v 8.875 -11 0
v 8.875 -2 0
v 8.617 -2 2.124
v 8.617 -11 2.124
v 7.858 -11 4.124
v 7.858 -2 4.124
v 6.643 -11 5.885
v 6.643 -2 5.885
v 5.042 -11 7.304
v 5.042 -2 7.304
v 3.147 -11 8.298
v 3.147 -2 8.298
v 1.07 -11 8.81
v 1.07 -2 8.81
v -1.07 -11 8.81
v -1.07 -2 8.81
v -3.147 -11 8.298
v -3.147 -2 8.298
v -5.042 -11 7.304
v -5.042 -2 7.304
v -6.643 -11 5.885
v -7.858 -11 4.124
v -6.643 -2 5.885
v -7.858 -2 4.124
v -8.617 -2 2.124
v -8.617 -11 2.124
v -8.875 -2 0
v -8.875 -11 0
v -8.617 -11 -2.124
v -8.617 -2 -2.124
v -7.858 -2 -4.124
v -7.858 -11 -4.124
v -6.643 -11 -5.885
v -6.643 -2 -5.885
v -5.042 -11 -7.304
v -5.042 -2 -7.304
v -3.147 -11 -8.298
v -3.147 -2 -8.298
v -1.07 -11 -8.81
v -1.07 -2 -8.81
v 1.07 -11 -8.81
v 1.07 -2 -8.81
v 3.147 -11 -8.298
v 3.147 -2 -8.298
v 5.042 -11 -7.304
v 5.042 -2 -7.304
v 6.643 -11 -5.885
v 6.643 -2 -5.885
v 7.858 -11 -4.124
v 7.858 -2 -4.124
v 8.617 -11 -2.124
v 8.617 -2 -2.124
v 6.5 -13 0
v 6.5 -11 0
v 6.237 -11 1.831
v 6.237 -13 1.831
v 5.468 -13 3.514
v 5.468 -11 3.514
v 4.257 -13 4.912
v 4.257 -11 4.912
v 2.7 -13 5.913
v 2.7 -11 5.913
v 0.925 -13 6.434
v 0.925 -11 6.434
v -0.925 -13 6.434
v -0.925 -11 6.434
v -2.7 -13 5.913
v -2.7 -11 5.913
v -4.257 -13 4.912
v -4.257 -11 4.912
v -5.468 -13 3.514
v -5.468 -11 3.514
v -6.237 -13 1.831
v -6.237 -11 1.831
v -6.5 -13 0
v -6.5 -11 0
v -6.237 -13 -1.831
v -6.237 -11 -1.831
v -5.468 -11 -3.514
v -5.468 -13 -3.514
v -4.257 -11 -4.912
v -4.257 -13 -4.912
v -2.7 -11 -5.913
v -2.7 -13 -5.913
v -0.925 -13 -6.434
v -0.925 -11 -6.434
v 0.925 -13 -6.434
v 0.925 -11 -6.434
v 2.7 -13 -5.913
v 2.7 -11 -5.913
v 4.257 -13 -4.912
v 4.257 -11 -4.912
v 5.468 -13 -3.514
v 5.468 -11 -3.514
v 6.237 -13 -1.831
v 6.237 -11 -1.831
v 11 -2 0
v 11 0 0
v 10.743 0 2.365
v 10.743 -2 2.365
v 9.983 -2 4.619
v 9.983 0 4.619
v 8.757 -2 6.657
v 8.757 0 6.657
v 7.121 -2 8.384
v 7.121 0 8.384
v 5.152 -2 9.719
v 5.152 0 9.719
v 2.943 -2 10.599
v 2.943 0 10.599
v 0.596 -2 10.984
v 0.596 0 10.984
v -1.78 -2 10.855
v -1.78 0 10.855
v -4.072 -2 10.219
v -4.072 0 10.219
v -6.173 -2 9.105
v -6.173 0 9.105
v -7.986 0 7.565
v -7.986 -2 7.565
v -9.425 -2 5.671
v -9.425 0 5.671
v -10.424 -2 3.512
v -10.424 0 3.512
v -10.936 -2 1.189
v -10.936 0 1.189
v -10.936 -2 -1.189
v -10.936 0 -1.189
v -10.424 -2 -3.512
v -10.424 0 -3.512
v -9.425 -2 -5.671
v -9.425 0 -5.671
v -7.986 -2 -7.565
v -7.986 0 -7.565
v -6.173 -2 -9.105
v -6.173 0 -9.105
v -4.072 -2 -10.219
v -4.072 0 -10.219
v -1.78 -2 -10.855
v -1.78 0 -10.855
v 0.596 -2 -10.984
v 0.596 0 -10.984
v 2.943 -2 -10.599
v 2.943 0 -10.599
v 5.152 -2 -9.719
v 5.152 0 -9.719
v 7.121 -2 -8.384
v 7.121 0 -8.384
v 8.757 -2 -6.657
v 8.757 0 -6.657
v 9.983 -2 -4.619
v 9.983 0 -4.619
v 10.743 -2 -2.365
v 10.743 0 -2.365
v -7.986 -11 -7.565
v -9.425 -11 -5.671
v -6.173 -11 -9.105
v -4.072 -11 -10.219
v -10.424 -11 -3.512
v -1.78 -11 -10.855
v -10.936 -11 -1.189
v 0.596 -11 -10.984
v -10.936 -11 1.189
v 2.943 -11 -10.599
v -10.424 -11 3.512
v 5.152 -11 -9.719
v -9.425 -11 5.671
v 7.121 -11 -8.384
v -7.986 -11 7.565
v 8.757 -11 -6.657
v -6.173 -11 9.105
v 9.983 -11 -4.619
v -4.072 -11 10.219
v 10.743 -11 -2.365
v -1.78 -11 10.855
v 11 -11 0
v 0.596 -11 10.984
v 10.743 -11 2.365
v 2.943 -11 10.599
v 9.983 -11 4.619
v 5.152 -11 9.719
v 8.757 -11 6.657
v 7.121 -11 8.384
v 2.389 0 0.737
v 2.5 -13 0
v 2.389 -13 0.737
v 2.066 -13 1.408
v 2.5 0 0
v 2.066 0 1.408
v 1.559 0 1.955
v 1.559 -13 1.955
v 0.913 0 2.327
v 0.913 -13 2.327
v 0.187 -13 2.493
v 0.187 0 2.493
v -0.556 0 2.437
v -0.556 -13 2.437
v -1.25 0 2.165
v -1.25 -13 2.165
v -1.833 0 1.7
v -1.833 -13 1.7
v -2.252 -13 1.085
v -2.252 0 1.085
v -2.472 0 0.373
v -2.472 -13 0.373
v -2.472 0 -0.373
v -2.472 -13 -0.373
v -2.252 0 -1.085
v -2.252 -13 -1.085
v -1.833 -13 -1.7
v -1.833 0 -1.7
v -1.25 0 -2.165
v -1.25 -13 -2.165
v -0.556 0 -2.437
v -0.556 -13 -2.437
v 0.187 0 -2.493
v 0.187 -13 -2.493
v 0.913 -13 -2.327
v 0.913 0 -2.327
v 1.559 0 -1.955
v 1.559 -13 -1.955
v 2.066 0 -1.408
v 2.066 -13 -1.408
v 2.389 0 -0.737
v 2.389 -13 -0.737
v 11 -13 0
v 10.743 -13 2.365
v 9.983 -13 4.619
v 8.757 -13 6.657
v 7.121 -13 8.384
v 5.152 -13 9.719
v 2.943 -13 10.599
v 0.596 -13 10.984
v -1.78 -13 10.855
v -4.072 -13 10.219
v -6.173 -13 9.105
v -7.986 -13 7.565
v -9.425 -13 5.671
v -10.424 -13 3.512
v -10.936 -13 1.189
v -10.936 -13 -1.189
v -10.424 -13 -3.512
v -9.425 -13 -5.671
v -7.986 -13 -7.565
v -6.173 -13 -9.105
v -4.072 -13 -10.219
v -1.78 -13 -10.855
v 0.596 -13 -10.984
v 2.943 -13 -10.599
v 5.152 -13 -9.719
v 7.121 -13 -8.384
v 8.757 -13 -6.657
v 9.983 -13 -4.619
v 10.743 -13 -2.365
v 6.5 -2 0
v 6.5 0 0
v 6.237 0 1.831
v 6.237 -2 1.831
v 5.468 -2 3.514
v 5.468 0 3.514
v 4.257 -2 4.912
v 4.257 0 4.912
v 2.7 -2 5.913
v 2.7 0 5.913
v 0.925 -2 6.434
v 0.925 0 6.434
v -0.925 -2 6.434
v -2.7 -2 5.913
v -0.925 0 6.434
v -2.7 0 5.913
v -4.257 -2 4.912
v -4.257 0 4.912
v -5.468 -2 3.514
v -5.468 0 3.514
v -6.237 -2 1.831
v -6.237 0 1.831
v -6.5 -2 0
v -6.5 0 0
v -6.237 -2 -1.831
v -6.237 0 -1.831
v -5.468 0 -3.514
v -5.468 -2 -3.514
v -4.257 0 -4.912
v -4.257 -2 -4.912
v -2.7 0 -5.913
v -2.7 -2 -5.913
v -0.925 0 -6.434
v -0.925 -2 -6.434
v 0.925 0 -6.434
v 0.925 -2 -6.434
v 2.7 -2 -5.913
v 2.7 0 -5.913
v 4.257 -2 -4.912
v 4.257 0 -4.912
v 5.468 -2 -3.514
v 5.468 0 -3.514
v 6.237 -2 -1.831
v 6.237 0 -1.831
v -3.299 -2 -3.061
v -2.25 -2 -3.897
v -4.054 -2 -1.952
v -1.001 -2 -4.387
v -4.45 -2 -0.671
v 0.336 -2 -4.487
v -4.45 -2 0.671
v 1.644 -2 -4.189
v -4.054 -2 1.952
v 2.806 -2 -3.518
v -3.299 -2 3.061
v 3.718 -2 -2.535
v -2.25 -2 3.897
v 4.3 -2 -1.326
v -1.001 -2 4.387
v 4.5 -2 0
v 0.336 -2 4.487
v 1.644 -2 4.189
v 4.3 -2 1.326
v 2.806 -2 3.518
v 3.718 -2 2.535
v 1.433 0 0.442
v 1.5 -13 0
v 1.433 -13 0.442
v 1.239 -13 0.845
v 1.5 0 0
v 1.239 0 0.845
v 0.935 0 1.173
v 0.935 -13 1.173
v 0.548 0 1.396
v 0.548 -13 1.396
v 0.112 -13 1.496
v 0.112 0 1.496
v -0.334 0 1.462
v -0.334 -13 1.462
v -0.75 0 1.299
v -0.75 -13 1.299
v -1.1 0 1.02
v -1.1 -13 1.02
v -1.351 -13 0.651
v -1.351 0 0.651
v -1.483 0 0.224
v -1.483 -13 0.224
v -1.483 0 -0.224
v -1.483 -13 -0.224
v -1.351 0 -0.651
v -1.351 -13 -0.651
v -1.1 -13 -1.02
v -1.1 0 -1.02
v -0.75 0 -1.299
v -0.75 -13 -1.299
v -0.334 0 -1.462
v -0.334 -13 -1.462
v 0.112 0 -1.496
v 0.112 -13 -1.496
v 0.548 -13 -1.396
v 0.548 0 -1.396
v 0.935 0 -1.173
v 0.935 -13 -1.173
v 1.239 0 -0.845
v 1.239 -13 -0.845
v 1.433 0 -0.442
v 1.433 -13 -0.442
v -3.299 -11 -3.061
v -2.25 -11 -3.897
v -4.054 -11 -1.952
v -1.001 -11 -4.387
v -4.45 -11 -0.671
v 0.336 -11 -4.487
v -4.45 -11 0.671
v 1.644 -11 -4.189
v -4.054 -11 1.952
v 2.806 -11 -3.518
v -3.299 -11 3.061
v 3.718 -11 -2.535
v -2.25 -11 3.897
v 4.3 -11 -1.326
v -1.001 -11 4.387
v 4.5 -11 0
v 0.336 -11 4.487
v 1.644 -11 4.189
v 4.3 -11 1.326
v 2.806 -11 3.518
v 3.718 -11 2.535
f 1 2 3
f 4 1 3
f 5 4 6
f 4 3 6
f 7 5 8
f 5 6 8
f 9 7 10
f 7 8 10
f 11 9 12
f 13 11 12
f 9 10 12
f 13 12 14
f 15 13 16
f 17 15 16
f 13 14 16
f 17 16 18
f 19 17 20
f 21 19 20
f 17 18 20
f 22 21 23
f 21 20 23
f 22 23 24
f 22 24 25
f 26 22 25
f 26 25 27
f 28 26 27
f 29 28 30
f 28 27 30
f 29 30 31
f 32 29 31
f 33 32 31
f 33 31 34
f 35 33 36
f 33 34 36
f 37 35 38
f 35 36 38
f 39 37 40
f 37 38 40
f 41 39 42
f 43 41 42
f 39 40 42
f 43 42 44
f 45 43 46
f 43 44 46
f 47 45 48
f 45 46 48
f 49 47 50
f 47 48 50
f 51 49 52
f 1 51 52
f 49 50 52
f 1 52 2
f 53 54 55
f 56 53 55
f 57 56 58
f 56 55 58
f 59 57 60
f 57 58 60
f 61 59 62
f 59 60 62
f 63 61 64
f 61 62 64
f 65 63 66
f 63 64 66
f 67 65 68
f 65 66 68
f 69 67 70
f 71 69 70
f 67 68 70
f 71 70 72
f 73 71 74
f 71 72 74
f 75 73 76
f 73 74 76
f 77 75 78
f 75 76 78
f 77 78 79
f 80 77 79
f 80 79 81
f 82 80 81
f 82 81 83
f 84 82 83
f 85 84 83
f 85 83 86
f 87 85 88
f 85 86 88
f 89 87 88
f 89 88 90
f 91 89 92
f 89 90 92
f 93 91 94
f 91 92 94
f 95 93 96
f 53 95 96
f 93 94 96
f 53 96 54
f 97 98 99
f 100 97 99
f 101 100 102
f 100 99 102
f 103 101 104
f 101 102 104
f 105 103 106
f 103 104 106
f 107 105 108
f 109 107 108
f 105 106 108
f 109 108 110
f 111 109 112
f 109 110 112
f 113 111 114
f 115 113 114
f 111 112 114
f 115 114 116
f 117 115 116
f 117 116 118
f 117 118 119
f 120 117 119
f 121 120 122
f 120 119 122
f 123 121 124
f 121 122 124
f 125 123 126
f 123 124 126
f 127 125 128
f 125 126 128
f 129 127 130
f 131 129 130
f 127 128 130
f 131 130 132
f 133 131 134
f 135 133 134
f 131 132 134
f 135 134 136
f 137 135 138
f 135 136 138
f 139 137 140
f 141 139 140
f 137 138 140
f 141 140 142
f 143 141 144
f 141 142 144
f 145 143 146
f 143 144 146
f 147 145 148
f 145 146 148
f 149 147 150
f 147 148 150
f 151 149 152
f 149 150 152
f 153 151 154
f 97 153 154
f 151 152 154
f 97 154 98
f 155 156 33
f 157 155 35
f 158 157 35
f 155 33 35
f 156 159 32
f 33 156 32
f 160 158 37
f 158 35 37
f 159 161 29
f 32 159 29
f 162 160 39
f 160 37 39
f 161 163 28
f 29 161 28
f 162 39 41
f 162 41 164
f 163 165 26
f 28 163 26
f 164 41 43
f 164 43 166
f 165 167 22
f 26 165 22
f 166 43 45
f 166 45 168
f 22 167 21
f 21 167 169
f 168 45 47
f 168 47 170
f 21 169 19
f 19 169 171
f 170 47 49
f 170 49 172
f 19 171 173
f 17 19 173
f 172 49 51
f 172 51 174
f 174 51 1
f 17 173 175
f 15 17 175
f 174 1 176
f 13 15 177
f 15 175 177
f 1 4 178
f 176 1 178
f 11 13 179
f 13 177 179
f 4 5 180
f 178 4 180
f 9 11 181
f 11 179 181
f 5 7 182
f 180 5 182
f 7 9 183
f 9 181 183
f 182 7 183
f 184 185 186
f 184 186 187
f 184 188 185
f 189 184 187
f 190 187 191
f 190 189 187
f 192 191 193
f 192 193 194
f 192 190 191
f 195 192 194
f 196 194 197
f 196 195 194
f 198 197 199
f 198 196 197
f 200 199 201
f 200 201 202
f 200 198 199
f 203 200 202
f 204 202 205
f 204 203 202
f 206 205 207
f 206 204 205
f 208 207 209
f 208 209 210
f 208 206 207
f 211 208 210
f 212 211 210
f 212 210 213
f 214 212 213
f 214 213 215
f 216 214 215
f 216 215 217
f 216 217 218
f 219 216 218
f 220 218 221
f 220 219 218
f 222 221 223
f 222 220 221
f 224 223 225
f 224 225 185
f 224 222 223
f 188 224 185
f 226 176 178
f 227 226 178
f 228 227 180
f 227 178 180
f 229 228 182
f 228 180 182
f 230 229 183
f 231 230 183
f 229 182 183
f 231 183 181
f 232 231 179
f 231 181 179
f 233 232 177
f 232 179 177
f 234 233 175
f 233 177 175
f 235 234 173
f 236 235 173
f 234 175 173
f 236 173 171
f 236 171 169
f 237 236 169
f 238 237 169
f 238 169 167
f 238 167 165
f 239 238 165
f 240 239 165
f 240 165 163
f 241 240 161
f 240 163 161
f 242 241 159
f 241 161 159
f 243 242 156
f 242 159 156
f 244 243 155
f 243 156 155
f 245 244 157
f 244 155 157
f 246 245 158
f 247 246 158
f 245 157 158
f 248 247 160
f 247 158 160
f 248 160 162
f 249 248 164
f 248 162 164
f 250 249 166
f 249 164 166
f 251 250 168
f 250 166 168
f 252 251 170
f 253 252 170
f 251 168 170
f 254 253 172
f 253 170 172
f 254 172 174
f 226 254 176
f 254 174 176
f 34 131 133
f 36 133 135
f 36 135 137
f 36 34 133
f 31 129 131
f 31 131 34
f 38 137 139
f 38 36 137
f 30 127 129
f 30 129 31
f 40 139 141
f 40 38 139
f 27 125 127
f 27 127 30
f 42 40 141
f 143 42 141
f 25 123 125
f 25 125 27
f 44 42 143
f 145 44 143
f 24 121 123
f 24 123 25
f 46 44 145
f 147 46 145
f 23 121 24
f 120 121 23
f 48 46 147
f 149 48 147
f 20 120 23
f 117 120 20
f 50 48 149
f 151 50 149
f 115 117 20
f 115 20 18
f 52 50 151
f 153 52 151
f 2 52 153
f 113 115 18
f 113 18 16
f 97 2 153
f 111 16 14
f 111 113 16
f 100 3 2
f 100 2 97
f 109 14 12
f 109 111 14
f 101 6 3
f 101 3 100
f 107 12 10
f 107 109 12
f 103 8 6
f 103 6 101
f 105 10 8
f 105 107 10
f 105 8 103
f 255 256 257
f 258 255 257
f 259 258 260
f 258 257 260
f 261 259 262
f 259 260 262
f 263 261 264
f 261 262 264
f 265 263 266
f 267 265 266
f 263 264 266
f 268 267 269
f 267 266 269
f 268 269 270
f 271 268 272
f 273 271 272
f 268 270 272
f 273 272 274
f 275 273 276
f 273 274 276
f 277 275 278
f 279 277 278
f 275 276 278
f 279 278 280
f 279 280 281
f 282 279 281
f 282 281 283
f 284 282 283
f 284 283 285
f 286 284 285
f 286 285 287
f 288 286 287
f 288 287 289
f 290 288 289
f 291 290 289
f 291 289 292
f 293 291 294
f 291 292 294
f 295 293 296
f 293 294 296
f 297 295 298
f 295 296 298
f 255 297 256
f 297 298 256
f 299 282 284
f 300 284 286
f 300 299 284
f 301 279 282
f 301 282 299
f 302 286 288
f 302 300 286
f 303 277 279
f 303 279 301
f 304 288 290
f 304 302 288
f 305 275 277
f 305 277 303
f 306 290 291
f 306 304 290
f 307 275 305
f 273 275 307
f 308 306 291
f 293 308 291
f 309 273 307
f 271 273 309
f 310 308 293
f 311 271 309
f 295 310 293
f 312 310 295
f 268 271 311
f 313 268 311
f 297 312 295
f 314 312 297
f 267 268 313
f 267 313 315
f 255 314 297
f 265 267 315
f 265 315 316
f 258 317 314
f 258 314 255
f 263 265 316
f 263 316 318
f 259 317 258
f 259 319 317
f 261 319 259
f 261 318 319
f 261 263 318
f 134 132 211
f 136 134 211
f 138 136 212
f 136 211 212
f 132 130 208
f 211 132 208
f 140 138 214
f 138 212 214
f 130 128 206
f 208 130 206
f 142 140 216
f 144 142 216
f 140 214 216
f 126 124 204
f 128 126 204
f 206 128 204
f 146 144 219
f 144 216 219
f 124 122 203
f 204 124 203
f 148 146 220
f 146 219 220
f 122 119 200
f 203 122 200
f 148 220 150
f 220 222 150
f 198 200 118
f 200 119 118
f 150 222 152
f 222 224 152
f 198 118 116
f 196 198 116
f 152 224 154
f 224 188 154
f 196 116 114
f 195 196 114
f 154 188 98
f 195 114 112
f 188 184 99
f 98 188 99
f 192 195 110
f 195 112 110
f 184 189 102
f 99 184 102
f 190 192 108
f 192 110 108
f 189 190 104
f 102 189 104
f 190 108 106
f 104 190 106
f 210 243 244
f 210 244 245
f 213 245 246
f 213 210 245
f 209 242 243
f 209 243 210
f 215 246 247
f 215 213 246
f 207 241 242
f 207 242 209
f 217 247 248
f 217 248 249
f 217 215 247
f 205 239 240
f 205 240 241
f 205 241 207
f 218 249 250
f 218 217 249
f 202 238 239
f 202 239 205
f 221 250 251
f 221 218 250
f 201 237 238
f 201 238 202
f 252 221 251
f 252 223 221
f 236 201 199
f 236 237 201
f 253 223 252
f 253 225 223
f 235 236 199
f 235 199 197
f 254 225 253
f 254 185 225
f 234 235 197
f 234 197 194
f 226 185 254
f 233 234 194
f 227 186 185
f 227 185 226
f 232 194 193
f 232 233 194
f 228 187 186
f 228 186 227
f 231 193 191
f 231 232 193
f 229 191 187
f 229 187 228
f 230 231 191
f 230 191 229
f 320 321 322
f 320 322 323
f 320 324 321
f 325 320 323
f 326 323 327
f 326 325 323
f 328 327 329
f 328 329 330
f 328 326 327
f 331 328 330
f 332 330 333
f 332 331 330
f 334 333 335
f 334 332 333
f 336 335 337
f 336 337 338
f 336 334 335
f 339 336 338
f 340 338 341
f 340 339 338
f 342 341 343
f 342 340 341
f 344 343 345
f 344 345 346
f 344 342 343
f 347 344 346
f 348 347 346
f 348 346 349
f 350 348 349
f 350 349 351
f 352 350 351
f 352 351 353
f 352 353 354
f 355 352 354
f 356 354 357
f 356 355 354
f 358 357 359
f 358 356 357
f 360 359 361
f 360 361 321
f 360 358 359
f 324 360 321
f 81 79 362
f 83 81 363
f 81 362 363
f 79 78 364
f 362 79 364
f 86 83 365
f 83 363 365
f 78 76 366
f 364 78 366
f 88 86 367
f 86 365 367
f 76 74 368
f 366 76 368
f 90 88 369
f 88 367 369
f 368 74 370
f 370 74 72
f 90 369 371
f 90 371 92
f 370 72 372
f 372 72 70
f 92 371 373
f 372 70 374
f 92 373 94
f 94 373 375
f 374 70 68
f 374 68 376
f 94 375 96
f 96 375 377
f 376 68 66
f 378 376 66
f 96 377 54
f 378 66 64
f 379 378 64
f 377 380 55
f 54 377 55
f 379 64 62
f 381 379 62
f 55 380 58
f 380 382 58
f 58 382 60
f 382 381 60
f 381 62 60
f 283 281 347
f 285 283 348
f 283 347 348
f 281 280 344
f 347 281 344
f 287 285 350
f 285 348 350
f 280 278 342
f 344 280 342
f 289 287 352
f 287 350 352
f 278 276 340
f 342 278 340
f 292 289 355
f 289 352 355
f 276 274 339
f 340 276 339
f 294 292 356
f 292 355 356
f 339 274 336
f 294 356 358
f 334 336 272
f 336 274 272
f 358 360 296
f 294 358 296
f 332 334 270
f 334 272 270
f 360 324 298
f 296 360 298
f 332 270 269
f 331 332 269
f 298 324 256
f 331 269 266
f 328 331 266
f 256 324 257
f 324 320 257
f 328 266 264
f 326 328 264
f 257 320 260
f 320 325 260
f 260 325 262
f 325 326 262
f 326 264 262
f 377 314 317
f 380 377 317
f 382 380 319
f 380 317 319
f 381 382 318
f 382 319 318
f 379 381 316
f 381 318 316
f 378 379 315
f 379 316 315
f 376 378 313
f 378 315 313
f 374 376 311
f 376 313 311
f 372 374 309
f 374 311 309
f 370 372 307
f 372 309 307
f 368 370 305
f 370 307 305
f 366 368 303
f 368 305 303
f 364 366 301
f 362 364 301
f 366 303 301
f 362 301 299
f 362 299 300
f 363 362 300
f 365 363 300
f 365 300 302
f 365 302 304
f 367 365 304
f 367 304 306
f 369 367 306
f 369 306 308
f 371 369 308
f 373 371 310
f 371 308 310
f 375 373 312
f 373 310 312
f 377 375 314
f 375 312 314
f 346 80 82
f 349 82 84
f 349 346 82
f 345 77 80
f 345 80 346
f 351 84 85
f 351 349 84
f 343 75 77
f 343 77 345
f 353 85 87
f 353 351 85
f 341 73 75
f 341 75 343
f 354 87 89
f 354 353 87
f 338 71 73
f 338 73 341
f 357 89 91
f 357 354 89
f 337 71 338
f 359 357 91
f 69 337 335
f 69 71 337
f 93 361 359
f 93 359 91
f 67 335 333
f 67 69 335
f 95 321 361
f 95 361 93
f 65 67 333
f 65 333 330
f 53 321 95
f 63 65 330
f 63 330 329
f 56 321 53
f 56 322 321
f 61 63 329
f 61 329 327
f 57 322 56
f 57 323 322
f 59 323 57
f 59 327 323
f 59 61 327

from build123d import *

# Parameters (mm, degrees)
F0_R      = 11
F0_R_2    = 2.5
F1_DEPTH  = 2
F2_R      = 8.875
F2_R_2    = 2.5
F3_DEPTH  = 9
F4_R      = 11
F4_R_2    = 8.875
F4_R_3    = 2.5
F5_DEPTH  = 2
F6_R      = 6.5
F6_R_2    = 1.5
F7_DEPTH  = 2
F8_R      = 4.5
F8_R_2    = 1.5
F9_DEPTH  = 9
F10_R     = 6.5
F10_R_2   = 4.5
F10_R_3   = 1.5
F11_DEPTH = 2


with BuildPart() as f1:
    # F0 (on Front) → F1 (new body)
    with BuildSketch(Plane.XZ):
        Circle(F0_R)
        Circle(F0_R_2, mode=Mode.SUBTRACT)
    extrude(amount=F1_DEPTH)

    # F2 (on face) → F3 (join)
    with BuildSketch(Plane.XZ.offset(2)):
        Circle(F2_R)
        Circle(F2_R_2, mode=Mode.SUBTRACT)
    extrude(amount=F3_DEPTH)

    # F4 (on face) → F5 (join)
    with BuildSketch(Plane.XZ.offset(11)):
        Circle(F4_R)
        Circle(F4_R_2, mode=Mode.SUBTRACT)
        Circle(F4_R_2)
        Circle(F4_R_3, mode=Mode.SUBTRACT)
    extrude(amount=F5_DEPTH)


with BuildPart() as f7:
    # F6 (on Front) → F7 (new body)
    with BuildSketch(Plane.XZ):
        Circle(F6_R)
        Circle(F6_R_2, mode=Mode.SUBTRACT)
    extrude(amount=F7_DEPTH)

    # F8 (on face) → F9 (join)
    with BuildSketch(Plane.XZ.offset(2)):
        Circle(F8_R)
        Circle(F8_R_2, mode=Mode.SUBTRACT)
    extrude(amount=F9_DEPTH)

    # F10 (on face) → F11 (join)
    with BuildSketch(Plane.XZ.offset(11)):
        Circle(F10_R)
        Circle(F10_R_2, mode=Mode.SUBTRACT)
        Circle(F10_R_2)
        Circle(F10_R_3, mode=Mode.SUBTRACT)
    extrude(amount=F11_DEPTH)


solid = Compound([f1.part, f7.part])
